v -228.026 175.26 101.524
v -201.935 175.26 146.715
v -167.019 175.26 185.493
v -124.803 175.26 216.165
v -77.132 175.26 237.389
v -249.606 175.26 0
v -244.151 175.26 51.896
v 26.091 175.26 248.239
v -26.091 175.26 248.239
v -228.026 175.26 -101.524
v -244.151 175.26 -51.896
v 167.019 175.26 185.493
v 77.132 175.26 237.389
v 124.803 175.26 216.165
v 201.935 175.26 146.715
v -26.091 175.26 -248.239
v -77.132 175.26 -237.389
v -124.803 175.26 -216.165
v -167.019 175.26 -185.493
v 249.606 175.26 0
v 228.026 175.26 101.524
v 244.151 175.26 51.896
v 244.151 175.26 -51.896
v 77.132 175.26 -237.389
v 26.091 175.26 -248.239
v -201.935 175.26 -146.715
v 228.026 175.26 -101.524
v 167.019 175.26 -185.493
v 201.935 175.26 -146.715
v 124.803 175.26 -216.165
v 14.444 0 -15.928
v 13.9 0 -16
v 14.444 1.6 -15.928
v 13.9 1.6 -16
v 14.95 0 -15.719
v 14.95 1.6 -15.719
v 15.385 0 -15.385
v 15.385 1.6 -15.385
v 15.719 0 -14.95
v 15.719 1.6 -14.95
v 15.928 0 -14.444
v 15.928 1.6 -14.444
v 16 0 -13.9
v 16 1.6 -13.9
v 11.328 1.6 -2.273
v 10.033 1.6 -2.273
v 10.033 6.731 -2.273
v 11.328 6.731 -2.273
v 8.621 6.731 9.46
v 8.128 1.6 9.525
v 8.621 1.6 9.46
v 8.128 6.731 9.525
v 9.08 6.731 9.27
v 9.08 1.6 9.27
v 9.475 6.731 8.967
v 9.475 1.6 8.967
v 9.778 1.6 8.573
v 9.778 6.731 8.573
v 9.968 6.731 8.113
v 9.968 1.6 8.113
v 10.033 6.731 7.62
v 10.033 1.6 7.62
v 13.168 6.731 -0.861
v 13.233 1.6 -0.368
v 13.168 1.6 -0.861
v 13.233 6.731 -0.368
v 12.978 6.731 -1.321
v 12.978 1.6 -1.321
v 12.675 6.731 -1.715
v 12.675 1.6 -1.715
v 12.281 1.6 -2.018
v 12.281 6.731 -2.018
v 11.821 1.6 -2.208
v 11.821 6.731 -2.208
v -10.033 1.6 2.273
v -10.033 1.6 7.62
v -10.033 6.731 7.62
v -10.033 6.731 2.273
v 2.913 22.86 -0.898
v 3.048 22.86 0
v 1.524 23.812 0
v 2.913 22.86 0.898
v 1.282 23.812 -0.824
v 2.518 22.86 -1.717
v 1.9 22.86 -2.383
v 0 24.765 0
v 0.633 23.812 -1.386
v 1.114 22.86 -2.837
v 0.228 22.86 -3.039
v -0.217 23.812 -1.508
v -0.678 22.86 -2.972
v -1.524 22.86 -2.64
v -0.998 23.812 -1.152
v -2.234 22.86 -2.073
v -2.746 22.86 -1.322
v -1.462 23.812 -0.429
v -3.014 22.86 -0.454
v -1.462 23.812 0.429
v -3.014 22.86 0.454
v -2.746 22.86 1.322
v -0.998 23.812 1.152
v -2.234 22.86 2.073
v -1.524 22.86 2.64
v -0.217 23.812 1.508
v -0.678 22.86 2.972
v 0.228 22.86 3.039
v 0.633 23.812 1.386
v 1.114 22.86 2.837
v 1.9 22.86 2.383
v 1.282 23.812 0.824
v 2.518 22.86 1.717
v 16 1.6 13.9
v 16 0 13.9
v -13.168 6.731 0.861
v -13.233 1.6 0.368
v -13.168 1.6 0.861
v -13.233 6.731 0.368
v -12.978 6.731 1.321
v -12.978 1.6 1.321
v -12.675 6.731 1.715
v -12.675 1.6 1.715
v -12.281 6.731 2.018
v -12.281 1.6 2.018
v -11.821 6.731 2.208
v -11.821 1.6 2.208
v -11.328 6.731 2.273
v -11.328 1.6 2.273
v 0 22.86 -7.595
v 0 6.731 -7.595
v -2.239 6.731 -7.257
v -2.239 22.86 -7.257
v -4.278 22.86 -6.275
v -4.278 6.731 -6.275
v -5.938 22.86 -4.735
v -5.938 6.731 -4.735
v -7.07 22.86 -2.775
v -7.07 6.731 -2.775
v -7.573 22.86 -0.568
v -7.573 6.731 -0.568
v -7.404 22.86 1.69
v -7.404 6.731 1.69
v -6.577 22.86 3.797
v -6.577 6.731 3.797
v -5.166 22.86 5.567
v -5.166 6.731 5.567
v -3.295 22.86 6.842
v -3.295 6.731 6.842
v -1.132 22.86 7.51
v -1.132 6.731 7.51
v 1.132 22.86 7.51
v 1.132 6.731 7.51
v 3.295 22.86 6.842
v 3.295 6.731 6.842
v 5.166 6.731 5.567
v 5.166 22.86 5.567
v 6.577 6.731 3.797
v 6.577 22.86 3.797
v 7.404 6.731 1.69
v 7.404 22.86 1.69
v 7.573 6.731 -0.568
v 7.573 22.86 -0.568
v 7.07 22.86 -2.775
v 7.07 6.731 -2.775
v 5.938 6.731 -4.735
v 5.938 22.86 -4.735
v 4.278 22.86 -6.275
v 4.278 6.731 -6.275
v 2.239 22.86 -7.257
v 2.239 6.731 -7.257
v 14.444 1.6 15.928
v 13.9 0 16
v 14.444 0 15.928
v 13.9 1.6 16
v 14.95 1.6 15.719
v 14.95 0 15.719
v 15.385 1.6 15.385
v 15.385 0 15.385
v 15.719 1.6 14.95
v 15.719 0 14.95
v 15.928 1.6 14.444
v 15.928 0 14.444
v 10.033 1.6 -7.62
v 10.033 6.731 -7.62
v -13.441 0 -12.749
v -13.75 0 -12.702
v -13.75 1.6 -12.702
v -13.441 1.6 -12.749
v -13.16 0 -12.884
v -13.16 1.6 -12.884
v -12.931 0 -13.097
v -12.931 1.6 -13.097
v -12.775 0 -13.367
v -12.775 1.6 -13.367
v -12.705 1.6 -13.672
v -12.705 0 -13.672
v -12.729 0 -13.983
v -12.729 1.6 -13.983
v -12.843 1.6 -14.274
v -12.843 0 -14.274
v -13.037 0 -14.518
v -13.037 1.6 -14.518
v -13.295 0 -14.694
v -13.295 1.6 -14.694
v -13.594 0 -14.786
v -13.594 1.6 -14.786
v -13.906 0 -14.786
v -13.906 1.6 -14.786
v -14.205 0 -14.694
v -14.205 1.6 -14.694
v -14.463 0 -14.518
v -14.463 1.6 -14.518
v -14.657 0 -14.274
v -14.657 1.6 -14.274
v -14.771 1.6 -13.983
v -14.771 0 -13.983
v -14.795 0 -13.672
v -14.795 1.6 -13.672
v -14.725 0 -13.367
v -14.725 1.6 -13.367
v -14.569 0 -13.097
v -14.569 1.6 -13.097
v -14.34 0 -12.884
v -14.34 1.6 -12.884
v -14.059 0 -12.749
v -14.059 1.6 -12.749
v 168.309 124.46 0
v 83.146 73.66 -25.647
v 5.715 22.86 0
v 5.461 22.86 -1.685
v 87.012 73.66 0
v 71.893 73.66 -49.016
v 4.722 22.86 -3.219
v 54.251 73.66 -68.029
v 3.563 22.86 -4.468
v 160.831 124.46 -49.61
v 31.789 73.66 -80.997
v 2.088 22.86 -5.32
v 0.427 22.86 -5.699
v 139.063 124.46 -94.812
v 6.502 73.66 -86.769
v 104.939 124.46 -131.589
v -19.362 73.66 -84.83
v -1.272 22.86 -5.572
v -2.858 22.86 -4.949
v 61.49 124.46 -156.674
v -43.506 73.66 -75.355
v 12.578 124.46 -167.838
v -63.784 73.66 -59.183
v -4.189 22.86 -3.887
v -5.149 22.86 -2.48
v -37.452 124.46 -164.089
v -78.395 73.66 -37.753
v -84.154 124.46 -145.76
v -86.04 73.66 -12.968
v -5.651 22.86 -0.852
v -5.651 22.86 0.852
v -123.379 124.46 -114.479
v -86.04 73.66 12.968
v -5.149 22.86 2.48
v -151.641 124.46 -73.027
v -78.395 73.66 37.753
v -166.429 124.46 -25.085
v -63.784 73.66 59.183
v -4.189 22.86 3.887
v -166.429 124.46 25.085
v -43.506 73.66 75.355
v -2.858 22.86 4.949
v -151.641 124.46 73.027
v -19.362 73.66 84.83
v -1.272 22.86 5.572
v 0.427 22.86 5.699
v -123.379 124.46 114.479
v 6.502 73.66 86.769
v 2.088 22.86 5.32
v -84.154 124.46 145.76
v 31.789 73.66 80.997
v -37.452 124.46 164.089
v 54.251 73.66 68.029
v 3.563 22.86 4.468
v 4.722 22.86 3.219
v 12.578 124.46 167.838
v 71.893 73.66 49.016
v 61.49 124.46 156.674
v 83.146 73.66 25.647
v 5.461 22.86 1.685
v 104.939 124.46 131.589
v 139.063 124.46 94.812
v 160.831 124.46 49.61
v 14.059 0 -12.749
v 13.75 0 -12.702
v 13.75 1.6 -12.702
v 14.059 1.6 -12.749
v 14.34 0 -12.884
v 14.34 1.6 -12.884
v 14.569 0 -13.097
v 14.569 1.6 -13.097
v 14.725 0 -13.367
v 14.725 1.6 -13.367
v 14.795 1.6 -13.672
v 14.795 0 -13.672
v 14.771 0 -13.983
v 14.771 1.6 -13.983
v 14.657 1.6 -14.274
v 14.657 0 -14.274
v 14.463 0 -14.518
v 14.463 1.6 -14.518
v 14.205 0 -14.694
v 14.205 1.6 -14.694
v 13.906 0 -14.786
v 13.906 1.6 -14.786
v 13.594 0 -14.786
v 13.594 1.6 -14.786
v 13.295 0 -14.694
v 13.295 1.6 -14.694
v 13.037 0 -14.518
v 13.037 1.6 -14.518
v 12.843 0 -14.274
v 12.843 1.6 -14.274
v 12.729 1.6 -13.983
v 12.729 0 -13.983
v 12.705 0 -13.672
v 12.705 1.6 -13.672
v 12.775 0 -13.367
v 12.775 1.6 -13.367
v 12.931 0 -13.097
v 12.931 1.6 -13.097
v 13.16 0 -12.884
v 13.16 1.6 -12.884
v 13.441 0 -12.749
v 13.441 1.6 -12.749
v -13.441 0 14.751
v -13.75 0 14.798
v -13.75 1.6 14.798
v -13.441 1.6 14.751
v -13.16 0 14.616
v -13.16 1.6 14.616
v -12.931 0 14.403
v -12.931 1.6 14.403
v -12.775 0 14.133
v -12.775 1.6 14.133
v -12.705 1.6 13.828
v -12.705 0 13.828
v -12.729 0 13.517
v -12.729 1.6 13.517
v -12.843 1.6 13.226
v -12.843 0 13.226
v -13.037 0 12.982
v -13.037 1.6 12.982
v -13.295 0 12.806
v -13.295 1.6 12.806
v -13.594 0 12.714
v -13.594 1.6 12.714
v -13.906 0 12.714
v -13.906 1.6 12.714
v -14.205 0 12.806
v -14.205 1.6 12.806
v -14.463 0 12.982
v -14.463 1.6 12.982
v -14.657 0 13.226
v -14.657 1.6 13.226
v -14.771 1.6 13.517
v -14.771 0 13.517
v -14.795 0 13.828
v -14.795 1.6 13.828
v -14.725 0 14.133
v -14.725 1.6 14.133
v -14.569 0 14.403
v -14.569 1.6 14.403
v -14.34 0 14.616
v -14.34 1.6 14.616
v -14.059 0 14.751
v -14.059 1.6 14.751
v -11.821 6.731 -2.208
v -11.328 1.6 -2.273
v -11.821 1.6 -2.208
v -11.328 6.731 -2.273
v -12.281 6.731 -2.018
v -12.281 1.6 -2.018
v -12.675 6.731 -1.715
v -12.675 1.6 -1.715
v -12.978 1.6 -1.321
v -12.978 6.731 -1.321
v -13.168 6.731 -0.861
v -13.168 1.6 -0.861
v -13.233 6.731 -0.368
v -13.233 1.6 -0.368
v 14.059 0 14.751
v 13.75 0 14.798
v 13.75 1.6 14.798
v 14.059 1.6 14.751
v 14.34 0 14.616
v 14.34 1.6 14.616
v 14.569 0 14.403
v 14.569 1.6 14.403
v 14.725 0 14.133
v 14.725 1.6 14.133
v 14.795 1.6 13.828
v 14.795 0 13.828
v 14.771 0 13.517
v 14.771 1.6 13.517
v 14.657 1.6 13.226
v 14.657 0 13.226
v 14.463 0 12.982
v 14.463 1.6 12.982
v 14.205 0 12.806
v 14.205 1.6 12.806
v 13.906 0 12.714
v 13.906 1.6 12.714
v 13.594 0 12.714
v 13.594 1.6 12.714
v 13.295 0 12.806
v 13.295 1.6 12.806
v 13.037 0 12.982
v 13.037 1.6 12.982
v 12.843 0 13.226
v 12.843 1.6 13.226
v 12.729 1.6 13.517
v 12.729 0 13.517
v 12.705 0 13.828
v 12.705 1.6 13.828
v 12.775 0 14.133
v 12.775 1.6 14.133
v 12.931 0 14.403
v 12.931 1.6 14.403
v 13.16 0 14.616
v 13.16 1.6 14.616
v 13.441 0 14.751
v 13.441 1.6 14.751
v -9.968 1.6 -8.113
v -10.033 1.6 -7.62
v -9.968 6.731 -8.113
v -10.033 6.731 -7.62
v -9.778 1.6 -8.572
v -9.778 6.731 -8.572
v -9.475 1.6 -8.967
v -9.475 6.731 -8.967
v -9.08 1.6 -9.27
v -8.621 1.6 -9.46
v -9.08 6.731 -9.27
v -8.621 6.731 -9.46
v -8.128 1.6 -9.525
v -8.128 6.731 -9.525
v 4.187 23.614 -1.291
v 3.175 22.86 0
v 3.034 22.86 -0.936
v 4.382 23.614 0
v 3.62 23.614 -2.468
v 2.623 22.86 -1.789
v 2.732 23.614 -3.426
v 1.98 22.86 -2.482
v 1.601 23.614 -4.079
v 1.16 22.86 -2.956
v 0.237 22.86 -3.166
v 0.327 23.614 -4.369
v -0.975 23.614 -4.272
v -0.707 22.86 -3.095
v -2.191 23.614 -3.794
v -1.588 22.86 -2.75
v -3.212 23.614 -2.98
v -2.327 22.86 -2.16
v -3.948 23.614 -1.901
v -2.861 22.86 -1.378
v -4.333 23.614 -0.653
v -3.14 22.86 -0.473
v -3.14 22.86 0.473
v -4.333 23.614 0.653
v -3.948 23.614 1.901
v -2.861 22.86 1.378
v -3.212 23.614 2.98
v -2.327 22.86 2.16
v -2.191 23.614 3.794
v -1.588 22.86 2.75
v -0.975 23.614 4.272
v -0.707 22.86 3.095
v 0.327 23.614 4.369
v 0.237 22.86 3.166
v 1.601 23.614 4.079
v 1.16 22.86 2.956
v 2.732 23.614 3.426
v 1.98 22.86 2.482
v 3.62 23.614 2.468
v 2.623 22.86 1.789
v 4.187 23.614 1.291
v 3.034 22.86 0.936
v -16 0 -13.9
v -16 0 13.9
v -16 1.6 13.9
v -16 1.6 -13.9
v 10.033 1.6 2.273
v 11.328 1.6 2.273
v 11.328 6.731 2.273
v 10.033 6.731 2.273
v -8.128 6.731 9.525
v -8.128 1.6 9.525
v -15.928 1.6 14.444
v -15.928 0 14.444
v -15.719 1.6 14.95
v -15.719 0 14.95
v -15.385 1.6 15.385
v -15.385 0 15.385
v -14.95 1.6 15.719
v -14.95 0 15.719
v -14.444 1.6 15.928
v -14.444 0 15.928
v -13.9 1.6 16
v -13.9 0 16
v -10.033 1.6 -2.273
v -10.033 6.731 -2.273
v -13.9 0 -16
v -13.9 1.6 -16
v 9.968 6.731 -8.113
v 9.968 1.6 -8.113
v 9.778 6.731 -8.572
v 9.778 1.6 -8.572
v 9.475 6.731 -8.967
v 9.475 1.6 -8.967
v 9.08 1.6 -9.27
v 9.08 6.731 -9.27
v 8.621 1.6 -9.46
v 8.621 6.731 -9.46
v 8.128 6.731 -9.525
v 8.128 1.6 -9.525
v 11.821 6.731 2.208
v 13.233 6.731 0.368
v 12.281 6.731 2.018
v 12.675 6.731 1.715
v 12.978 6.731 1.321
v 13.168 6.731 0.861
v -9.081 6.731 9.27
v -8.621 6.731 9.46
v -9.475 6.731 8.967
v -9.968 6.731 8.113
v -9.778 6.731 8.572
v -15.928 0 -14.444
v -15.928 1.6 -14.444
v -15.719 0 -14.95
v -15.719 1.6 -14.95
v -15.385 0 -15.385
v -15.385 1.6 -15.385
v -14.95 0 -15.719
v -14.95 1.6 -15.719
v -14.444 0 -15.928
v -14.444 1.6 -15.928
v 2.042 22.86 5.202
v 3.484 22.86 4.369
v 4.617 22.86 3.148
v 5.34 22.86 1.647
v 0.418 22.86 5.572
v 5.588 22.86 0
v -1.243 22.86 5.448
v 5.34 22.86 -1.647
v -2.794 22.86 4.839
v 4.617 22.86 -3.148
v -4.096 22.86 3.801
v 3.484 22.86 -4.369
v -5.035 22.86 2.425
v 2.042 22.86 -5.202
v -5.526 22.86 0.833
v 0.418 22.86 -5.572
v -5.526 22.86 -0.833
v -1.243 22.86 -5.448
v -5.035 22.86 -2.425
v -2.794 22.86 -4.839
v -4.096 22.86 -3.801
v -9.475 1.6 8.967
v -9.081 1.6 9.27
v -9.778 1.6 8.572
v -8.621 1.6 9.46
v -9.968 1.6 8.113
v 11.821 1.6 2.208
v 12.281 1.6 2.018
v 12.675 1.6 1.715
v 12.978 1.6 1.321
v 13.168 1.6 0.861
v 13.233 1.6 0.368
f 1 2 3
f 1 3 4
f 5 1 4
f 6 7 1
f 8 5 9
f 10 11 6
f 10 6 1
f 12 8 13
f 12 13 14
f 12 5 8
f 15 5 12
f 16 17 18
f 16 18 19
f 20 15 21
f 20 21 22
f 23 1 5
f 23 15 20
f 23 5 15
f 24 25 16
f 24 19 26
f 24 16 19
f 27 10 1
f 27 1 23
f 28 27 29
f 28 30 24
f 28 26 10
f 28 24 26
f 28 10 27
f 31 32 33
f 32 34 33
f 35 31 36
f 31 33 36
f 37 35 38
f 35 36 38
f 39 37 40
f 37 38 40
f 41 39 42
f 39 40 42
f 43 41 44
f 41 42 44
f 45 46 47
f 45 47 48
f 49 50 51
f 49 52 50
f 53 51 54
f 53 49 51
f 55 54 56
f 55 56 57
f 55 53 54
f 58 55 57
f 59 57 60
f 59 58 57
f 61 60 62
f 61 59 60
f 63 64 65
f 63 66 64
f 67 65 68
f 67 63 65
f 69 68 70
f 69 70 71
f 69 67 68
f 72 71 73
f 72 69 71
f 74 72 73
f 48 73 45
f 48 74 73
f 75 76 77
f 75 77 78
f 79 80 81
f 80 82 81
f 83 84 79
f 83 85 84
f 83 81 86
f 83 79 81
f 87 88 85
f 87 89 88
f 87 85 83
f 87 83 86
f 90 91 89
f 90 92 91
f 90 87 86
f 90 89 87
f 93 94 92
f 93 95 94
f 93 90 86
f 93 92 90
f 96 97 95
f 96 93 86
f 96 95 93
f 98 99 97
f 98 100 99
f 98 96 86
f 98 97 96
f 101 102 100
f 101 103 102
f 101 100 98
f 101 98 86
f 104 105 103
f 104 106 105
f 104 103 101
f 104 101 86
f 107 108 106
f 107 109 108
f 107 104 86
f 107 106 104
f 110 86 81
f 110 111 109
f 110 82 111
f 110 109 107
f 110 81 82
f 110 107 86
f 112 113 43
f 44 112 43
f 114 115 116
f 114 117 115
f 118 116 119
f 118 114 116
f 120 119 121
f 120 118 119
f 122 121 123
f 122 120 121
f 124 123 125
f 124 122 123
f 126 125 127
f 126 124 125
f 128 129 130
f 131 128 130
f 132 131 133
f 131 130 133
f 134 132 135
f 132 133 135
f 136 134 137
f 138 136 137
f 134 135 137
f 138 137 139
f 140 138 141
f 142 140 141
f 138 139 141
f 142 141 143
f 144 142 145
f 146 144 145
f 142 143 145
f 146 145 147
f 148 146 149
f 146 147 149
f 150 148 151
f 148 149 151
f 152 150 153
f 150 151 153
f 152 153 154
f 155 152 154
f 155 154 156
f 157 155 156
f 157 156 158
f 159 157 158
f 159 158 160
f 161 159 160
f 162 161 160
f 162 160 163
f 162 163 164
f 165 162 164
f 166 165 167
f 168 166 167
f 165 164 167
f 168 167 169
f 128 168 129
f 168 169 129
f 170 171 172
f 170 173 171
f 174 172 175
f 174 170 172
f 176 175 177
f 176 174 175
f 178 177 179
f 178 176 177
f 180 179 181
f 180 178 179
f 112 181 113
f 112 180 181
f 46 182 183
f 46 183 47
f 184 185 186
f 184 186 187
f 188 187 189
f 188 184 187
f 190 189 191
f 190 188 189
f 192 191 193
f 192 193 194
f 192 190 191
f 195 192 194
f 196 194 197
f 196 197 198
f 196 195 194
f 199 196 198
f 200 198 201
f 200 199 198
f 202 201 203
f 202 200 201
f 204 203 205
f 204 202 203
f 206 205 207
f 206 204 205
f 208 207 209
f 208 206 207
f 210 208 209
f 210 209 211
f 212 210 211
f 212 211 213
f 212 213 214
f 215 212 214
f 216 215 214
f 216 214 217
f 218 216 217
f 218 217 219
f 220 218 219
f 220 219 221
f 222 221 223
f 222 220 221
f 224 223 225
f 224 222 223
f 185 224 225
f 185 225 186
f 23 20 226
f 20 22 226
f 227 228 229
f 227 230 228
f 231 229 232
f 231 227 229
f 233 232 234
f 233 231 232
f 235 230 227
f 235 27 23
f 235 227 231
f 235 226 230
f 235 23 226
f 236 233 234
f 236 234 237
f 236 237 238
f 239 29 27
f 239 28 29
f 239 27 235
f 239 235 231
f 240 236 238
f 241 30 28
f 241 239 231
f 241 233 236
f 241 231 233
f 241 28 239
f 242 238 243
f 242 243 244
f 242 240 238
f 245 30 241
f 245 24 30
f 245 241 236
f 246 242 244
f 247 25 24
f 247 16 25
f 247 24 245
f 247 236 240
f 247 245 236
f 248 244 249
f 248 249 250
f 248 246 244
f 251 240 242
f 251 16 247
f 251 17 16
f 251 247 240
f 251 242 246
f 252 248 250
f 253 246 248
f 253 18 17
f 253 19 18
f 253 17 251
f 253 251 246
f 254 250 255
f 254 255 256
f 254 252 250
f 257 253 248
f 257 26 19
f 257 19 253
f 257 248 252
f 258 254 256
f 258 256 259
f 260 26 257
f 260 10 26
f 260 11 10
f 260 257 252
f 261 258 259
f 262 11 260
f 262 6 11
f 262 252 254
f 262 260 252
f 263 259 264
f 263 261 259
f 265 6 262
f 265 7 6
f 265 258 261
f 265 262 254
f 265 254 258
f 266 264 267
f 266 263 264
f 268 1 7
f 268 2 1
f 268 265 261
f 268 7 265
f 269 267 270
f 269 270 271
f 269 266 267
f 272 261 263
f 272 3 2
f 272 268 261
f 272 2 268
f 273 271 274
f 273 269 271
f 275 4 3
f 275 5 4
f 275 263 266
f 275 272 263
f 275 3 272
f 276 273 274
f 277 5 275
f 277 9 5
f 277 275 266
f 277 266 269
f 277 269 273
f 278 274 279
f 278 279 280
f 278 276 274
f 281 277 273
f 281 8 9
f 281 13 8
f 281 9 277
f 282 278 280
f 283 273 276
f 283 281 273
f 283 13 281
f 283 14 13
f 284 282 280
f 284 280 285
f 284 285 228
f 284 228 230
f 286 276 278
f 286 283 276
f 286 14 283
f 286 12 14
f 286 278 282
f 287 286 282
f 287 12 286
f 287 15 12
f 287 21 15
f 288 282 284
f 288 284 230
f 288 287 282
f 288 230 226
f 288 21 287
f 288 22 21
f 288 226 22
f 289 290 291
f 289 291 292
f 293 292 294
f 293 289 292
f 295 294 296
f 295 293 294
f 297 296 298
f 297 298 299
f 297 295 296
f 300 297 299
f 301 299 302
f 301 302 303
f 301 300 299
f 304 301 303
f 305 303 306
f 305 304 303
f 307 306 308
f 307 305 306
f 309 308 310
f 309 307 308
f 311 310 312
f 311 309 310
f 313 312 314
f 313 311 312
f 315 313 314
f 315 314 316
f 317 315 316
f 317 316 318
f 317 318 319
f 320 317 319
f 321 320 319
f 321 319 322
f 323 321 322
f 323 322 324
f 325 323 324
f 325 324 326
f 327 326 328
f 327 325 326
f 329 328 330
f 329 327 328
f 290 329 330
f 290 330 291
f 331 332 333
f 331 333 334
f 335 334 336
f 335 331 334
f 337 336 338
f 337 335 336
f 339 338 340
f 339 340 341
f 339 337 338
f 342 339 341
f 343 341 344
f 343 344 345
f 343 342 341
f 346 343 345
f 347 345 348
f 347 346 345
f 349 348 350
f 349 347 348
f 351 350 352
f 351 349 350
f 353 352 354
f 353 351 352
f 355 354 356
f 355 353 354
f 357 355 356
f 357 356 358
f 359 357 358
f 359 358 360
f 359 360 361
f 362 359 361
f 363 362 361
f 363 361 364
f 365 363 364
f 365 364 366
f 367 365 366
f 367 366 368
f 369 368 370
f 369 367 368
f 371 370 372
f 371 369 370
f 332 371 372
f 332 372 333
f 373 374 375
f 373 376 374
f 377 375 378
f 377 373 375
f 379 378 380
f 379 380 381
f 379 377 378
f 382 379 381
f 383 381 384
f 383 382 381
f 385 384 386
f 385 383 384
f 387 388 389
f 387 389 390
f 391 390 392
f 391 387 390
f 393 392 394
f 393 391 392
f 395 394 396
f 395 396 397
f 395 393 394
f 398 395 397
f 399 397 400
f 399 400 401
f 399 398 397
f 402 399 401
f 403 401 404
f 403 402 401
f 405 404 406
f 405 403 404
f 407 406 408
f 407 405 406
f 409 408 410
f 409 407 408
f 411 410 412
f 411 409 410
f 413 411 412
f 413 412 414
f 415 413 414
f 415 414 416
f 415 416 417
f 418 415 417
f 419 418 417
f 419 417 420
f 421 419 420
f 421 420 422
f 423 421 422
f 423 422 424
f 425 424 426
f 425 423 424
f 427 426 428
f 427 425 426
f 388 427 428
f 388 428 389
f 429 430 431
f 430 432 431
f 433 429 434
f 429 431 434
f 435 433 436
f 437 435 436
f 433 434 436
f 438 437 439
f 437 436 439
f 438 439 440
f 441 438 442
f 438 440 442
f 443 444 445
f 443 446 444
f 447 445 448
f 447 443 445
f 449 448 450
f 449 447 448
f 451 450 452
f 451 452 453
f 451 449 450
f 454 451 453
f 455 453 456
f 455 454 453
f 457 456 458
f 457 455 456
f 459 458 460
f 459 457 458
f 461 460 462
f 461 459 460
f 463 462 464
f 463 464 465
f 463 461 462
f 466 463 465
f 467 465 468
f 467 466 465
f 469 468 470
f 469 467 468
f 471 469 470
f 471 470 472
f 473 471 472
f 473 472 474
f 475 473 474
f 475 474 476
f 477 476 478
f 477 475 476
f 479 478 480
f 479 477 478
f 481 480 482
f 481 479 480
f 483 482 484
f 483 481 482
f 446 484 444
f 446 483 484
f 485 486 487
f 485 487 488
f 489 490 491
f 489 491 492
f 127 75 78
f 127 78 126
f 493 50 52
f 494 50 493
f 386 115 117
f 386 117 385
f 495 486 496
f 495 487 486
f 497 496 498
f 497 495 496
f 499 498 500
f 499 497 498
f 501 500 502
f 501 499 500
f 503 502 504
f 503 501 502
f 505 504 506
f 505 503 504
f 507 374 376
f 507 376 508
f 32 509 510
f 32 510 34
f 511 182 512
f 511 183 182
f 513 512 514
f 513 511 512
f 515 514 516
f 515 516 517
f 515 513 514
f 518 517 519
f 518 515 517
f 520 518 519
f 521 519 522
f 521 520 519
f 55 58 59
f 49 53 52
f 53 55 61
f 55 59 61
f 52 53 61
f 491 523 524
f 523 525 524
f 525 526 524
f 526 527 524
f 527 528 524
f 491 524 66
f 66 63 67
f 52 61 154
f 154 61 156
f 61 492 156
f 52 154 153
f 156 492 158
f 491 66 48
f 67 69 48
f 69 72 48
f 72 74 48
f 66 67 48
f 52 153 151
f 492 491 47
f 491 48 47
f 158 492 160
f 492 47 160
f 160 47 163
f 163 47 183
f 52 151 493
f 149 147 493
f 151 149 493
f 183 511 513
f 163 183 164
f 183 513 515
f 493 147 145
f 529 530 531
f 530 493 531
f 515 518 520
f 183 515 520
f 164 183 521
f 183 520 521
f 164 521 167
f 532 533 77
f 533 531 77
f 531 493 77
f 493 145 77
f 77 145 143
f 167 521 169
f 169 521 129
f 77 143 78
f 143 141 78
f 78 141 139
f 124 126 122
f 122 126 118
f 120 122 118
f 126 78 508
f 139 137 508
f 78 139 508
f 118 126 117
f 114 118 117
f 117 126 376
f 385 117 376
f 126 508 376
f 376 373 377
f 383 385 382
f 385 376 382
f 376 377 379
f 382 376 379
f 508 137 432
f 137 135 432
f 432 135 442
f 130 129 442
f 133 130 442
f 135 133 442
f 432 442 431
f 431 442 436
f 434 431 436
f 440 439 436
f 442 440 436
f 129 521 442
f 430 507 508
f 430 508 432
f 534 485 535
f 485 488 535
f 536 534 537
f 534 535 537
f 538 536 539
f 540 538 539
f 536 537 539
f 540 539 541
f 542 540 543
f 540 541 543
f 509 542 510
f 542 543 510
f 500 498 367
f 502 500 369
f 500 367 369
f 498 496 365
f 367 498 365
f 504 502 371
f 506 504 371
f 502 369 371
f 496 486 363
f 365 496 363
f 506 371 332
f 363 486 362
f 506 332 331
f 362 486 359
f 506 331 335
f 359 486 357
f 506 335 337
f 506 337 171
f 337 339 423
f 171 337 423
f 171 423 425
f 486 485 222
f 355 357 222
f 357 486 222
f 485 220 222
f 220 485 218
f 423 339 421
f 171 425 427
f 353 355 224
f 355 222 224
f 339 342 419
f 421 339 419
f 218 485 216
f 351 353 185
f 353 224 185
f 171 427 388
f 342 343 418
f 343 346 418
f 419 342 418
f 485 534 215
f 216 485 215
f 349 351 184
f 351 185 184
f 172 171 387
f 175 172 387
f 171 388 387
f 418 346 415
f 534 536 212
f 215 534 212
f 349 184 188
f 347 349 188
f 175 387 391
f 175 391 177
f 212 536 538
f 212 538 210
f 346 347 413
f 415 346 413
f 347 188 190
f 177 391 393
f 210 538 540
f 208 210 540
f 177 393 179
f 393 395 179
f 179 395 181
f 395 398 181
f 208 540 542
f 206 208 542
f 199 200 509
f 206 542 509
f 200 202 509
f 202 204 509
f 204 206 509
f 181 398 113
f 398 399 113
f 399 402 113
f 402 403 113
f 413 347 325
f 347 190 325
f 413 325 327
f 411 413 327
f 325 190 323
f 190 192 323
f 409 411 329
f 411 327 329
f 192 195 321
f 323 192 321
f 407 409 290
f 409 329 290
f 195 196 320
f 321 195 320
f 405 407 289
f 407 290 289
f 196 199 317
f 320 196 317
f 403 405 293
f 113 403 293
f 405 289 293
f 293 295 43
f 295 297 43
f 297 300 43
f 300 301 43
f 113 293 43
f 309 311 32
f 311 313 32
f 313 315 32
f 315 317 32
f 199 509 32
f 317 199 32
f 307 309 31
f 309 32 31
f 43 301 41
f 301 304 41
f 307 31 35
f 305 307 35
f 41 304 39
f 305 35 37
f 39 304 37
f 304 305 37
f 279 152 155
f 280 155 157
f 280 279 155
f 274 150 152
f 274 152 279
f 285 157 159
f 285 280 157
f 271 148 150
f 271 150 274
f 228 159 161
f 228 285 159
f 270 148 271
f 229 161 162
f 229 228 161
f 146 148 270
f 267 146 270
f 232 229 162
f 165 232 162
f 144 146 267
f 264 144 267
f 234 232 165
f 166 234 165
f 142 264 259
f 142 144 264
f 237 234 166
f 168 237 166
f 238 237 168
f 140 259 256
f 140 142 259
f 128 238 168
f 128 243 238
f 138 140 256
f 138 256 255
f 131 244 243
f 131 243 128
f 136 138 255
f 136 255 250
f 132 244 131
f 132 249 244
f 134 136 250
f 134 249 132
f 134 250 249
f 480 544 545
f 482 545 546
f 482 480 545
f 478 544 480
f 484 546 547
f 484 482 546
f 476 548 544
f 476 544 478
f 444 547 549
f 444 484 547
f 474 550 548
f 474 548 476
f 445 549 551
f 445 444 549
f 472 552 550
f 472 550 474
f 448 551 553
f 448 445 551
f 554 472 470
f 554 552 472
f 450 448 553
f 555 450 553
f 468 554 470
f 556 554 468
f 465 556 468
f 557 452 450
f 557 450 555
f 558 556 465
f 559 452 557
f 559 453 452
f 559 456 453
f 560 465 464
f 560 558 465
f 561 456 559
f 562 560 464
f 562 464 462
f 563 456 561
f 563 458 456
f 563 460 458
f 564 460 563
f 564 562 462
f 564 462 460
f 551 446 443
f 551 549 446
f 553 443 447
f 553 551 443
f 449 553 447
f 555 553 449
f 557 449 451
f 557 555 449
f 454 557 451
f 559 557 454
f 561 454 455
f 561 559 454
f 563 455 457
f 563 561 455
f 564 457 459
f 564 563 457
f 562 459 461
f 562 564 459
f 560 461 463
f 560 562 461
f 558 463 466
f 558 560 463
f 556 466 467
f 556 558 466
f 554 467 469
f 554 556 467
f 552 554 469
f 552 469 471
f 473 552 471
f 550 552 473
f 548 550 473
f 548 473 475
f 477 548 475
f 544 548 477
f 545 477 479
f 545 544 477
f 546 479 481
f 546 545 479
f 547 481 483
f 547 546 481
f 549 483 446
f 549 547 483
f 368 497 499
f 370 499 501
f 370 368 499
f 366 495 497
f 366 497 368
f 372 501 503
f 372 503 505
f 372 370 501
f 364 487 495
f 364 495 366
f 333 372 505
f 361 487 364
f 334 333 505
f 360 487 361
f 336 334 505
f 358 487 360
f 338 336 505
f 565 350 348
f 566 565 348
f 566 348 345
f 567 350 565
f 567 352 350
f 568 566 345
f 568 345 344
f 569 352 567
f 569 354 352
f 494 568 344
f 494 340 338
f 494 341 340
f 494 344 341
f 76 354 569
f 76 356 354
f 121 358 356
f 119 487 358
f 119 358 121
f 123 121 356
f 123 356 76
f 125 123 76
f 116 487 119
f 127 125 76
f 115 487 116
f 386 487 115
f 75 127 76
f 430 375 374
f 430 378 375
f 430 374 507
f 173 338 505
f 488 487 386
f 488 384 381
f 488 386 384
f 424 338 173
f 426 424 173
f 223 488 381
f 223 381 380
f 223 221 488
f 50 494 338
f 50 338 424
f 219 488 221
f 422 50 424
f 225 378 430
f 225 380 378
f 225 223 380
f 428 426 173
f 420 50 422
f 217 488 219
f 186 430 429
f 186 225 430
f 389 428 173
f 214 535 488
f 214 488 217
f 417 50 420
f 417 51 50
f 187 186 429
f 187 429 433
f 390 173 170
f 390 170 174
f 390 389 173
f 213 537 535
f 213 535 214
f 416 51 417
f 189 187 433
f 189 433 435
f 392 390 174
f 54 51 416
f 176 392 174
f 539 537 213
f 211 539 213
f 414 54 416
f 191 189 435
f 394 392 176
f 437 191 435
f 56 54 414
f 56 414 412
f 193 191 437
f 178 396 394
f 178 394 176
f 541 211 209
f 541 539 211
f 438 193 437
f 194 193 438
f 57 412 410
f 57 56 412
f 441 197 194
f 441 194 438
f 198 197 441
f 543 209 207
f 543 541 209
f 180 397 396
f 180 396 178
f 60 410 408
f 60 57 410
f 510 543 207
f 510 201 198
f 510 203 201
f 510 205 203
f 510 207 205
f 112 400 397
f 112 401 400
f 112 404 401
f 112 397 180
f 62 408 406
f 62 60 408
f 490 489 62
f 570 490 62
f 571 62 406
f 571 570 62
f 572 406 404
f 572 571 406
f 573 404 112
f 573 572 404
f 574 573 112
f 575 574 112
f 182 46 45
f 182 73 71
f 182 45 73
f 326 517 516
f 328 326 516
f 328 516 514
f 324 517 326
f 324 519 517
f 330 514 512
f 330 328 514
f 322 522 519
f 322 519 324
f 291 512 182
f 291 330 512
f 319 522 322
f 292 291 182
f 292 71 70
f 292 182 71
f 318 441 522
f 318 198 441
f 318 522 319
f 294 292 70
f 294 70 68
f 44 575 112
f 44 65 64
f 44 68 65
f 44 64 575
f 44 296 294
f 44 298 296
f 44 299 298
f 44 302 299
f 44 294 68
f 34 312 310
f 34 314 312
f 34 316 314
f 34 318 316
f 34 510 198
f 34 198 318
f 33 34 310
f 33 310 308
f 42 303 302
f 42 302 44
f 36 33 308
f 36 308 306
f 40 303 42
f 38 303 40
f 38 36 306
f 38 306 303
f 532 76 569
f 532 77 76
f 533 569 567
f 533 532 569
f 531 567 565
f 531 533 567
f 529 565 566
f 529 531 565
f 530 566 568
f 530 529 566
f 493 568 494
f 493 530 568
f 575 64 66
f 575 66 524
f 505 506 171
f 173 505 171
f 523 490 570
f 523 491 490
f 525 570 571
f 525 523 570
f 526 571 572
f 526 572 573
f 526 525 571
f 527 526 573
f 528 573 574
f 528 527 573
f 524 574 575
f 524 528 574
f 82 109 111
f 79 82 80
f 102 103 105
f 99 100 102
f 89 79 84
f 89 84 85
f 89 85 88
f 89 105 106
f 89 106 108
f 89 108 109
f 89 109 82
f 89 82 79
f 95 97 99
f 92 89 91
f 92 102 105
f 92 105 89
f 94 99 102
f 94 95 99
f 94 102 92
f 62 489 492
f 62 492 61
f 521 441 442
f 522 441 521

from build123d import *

# Parameters (mm, degrees)
SKETCH1_W           = 32
SKETCH1_H           = 32
SKETCH1_R           = 1.04775
BOSS_EXTRUDE1_DEPTH = 1.6002
BOSS_EXTRUDE2_DEPTH = 5.1308
FILLET1_R           = 2.1
FILLET2_R           = 1.905
SKETCH3_R           = 7.5946
BOSS_EXTRUDE3_DEPTH = 16.129


# Read off the part's stored shape, not the designer's step: Extrude-Thin2
with BuildPart() as part:
    # Sketch1 → Boss-Extrude1 (new body)
    with BuildSketch(Plane(origin=(0, 0, 0), x_dir=(1, 0, 0), z_dir=(0, 1, 0))):
        Rectangle(SKETCH1_W, SKETCH1_H)
        with Locations(Location((13.7500106, 13.7500106, 0), (0, 0, 270))):
            Circle(SKETCH1_R, mode=Mode.SUBTRACT)
        with Locations(Location((-13.7500106, 13.7500106, 0), (0, 0, 270))):
            Circle(SKETCH1_R, mode=Mode.SUBTRACT)
        with Locations(Location((-13.75, -13.7500106, 0), (0, 0, 270))):
            Circle(SKETCH1_R, mode=Mode.SUBTRACT)
        with Locations(Location((13.7500106, -13.7500106, 0), (0, 0, 270))):
            Circle(SKETCH1_R, mode=Mode.SUBTRACT)
    extrude(amount=BOSS_EXTRUDE1_DEPTH)

    # Sketch2 → Boss-Extrude2 (add)
    with BuildSketch(Plane(origin=(0, 1.6002, 0), x_dir=(1, 0, 0), z_dir=(0, 1, 0))):
        Polygon((-10.033, 9.525), (10.033, 9.525), (10.033, 2.2733), (13.2334, 2.2733), (13.2334, -2.2733), (10.033, -2.2733), (10.033, -9.525), (-10.033, -9.525), (-10.033, -2.2733), (-13.2334, -2.2733), (-13.2334, 2.2733), (-10.033, 2.2733), align=None)
    extrude(amount=BOSS_EXTRUDE2_DEPTH)

    # Fillet1
    fillet1_edges = [part.edges().sort_by_distance(p)[0] for p in [
        (-16, 0.8001, -16),
        (16, 0.8001, -16),
        (16, 0.8001, 16),
        (-16, 0.8001, 16),
    ]]
    fillet(fillet1_edges, radius=FILLET1_R)

    # Fillet2
    fillet2_edges = [part.edges().sort_by_distance(p)[0] for p in [
        (-10.033, 4.1656, -9.525),
        (-13.2334, 4.1656, -2.2733),
        (-13.2334, 4.1656, 2.2733),
        (-10.033, 4.1656, 9.525),
        (10.033, 4.1656, 9.525),
        (13.2334, 4.1656, 2.2733),
        (13.2334, 4.1656, -2.2733),
        (10.033, 4.1656, -9.525),
    ]]
    fillet(fillet2_edges, radius=FILLET2_R)

    # Sketch3 → Boss-Extrude3 (add)
    with BuildSketch(Plane(origin=(0, 6.731, 0), x_dir=(1, 0, 0), z_dir=(0, 1, 0))):
        with Locations(Location((0, 0, 0), (0, 0, 90))):
            Circle(SKETCH3_R)
    extrude(amount=BOSS_EXTRUDE3_DEPTH)

    # Extrude-Thin2 outline → Extrude-Thin2 (revolve)
    with BuildSketch(Plane.XY):
        Polygon((0, 175.26), (0, 24.764601785), (3.048, 22.86), (3.175, 22.86), (4.3815, 23.613904873), (5.588, 22.86), (5.715, 22.86), (249.605982226, 175.26), align=None)
    revolve(axis=Axis((0, 0, 0), (0, 1, 0)))


solid = part.part
